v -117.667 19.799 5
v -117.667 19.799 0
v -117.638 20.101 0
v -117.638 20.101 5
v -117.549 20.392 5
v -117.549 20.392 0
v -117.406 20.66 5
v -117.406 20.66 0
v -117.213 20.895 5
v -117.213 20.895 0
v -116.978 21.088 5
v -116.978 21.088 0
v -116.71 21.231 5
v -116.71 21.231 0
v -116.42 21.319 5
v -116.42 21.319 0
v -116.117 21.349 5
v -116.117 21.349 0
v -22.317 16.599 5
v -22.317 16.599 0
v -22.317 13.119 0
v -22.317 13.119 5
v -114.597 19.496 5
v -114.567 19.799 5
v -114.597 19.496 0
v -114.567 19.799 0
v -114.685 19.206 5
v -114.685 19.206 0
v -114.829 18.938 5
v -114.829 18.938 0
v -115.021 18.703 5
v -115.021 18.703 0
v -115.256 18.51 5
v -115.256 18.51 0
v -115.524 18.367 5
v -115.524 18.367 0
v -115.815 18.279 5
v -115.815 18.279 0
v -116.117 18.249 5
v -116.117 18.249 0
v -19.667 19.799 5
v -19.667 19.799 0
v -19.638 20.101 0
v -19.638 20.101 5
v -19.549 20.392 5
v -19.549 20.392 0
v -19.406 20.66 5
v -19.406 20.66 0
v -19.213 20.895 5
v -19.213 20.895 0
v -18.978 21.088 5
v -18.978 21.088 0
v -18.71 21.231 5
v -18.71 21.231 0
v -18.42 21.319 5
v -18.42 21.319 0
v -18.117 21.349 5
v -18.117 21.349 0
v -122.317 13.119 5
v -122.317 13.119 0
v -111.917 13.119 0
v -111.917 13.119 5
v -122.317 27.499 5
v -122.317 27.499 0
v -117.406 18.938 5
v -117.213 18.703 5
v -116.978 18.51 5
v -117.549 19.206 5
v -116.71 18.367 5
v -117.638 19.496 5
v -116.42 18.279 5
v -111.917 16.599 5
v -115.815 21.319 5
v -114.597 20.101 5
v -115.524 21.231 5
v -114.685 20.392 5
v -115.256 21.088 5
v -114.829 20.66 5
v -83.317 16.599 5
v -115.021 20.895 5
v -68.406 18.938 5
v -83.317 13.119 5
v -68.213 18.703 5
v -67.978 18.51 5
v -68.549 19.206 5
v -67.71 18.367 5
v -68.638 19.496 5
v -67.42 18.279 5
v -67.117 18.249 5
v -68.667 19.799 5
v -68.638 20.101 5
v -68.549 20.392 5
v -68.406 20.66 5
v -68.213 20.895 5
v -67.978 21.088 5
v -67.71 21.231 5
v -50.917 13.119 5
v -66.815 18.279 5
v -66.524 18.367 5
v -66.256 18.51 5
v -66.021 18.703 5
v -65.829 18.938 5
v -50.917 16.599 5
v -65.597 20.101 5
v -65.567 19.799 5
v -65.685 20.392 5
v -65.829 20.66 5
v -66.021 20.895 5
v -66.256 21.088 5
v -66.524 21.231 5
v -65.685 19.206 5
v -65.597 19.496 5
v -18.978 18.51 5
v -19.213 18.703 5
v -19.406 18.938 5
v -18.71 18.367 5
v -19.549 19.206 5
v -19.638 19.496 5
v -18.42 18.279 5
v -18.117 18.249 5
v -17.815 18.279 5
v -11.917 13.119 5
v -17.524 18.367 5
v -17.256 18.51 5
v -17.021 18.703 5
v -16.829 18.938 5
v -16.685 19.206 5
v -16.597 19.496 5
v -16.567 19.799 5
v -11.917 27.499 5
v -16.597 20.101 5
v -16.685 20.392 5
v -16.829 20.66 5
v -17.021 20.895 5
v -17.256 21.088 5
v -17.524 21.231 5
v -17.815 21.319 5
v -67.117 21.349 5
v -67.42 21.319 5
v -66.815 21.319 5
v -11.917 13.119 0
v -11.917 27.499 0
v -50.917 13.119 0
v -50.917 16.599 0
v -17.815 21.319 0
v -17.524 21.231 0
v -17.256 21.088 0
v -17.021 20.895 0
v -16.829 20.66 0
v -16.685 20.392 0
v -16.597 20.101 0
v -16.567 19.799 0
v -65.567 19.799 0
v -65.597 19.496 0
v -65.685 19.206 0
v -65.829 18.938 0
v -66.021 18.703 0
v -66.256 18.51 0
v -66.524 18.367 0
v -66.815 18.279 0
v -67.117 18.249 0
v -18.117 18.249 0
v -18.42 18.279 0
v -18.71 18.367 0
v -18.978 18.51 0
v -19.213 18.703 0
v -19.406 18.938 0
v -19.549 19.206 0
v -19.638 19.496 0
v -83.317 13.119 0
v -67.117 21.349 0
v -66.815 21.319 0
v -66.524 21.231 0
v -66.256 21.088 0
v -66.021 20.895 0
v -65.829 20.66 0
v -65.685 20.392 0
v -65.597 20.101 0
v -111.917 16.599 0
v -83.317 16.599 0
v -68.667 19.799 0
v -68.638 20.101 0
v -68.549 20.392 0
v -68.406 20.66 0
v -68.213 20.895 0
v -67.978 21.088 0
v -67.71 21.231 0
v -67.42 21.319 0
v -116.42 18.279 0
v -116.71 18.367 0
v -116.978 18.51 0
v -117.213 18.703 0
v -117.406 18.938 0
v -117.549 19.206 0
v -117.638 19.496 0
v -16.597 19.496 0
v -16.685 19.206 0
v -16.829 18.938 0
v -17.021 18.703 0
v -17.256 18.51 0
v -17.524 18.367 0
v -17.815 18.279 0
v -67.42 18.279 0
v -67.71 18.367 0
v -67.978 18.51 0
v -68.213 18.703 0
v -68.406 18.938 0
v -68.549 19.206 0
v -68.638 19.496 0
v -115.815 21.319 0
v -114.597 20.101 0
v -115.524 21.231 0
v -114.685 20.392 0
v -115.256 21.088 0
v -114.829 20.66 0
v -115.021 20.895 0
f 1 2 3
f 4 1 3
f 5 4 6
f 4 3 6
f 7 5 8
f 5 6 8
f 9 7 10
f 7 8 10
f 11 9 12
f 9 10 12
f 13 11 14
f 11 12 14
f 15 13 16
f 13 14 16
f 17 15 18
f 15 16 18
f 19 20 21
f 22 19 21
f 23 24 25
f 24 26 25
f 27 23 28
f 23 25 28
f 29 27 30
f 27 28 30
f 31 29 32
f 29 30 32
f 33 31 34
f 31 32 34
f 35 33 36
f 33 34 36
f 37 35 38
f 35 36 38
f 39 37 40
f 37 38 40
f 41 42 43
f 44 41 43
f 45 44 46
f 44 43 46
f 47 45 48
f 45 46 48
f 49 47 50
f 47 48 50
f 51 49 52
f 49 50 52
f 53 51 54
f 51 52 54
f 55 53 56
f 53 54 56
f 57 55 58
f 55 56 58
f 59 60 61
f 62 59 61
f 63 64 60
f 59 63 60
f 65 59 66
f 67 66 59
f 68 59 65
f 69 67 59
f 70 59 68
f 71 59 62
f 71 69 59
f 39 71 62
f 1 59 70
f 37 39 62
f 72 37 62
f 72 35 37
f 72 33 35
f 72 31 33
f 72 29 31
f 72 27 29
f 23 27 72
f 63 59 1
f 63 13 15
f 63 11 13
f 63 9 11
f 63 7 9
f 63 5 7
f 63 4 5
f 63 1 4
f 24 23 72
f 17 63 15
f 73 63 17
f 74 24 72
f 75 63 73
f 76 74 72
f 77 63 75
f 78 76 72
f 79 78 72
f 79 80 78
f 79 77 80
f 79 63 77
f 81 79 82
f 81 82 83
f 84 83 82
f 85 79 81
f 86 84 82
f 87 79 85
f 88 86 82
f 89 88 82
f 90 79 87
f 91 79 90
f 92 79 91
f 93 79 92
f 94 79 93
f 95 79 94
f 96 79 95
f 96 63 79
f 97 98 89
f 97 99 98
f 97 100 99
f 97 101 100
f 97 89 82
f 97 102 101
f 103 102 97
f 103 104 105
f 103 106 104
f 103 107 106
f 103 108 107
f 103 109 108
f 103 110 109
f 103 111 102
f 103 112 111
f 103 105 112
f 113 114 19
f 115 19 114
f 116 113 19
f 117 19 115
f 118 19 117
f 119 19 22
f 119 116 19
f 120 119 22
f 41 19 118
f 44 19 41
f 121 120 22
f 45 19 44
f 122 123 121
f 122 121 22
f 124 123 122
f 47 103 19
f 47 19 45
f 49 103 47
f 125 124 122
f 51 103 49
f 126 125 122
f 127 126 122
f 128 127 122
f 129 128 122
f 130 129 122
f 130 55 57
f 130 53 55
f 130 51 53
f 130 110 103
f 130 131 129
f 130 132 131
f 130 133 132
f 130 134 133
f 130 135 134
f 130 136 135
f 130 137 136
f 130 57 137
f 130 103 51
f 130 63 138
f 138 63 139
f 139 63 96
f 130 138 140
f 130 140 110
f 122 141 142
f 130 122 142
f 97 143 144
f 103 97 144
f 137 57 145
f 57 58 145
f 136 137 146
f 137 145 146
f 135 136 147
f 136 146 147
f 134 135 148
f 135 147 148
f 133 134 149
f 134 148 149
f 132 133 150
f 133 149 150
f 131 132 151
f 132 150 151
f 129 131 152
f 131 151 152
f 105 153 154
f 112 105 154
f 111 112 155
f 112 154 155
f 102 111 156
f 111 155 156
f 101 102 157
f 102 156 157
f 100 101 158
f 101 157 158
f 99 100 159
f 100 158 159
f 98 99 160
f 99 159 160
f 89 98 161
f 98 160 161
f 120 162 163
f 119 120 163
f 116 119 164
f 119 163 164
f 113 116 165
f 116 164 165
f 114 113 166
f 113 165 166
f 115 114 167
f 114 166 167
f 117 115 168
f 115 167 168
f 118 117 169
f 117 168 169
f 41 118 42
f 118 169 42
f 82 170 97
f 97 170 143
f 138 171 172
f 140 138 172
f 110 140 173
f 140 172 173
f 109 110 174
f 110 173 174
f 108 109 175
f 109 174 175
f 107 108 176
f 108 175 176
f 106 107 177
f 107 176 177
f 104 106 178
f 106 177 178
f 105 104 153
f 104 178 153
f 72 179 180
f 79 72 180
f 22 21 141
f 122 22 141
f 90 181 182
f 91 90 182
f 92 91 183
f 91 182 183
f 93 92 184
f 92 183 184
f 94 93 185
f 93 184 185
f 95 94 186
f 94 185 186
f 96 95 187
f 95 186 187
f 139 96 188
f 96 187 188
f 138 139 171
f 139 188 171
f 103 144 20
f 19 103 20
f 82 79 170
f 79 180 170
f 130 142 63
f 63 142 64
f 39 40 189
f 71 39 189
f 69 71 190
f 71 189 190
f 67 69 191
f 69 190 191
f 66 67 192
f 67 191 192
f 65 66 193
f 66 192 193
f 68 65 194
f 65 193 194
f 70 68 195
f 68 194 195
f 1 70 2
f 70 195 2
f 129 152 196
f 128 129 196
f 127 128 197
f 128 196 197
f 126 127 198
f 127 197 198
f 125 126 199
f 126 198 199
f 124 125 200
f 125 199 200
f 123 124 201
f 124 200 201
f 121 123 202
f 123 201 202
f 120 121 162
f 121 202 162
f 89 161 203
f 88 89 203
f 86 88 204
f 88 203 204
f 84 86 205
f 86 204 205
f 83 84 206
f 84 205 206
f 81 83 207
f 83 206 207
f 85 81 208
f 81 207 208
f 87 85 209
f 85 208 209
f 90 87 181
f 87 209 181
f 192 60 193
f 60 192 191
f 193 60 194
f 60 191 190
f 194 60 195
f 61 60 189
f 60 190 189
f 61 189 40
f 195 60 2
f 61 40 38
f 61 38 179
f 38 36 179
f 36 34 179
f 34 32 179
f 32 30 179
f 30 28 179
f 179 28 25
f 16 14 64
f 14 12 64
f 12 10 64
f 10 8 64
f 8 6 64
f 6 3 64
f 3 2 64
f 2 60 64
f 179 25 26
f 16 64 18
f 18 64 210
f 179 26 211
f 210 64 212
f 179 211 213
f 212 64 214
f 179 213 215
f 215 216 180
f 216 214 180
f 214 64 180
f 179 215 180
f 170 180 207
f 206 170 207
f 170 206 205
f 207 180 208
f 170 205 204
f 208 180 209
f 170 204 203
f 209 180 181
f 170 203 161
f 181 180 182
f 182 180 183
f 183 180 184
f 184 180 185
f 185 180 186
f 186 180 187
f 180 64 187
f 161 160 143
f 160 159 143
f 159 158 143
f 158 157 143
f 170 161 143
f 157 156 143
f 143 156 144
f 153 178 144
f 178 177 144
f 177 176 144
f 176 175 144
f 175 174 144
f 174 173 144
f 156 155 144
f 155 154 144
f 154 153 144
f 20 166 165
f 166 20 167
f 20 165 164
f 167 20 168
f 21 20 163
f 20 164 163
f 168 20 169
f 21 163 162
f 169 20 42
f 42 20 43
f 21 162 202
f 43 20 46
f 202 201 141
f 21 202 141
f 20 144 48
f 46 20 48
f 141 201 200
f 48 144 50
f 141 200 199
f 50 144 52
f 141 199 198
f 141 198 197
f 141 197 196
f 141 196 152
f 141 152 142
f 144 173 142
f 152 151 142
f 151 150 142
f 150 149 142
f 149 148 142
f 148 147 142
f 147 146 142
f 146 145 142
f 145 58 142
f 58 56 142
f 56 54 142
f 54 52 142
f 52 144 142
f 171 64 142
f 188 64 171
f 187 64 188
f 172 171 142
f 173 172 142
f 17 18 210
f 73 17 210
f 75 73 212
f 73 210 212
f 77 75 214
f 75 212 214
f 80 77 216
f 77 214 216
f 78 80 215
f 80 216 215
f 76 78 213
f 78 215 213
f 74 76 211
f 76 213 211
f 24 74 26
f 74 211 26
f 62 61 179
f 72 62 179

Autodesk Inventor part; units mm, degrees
ref_plane "YZ Plane" through (0, 0, 0) normal (1, 0, 0) x (0, 1, 0)
ref_plane "XZ Plane" through (0, 0, 0) normal (0, 1, 0) x (-1, 0, 0)
ref_plane "XY Plane" through (0, 0, 0) normal (0, 0, 1) x (1, 0, 0)
sketch "Boceto1" plane through (0, 0, 0) normal (0, 0, 1) x (1, 0, 0)
  arc A0 (-67.1173, 21.3488) -> (-68.6673, 19.7988) centre (-67.1173, 19.7988) ccw
  arc A1 (-68.6673, 19.7988) -> (-67.1173, 18.2488) centre (-67.1173, 19.7988) ccw
  arc A2 (-67.1173, 18.2488) -> (-65.5673, 19.7988) centre (-67.1173, 19.7988) ccw
  arc A3 (-65.5673, 19.7988) -> (-67.1173, 21.3488) centre (-67.1173, 19.7988) ccw
  arc A4 (-116.1173, 21.3488) -> (-117.6673, 19.7988) centre (-116.1173, 19.7988) ccw
  arc A5 (-117.6673, 19.7988) -> (-116.1173, 18.2488) centre (-116.1173, 19.7988) ccw
  arc A6 (-116.1173, 18.2488) -> (-114.5673, 19.7988) centre (-116.1173, 19.7988) ccw
  arc A7 (-114.5673, 19.7988) -> (-116.1173, 21.3488) centre (-116.1173, 19.7988) ccw
  arc A8 (-18.1173, 21.3488) -> (-19.6673, 19.7988) centre (-18.1173, 19.7988) ccw
  arc A9 (-19.6673, 19.7988) -> (-18.1173, 18.2488) centre (-18.1173, 19.7988) ccw
  arc A10 (-18.1173, 18.2488) -> (-16.5673, 19.7988) centre (-18.1173, 19.7988) ccw
  arc A11 (-16.5673, 19.7988) -> (-18.1173, 21.3488) centre (-18.1173, 19.7988) ccw
  line L0 (-50.9173, 13.119) -> (-50.9173, 16.5988)
  line L1 (-50.9173, 16.5988) -> (-22.3173, 16.5988)
  line L2 (-22.3173, 16.5988) -> (-22.3173, 13.119)
  line L3 (-22.3173, 13.119) -> (-11.9173, 13.119)
  line L4 (-11.9173, 13.119) -> (-11.9173, 27.4988)
  line L5 (-11.9173, 27.4988) -> (-122.3173, 27.4988)
  line L6 (-122.3173, 27.4988) -> (-122.3173, 13.119)
  line L7 (-122.3173, 13.119) -> (-111.9173, 13.119)
  line L8 (-111.9173, 13.119) -> (-111.9173, 16.5988)
  line L9 (-111.9173, 16.5988) -> (-83.3173, 16.5988)
  line L10 (-83.3173, 16.5988) -> (-83.3173, 13.119)
  line L11 (-83.3173, 13.119) -> (-50.9173, 13.119)
  point P0 (0, 0)
extrude "Extrusión1" add sketch "Boceto1" along normal blind 5
properties part number "carro x lado motor pieza 3"
